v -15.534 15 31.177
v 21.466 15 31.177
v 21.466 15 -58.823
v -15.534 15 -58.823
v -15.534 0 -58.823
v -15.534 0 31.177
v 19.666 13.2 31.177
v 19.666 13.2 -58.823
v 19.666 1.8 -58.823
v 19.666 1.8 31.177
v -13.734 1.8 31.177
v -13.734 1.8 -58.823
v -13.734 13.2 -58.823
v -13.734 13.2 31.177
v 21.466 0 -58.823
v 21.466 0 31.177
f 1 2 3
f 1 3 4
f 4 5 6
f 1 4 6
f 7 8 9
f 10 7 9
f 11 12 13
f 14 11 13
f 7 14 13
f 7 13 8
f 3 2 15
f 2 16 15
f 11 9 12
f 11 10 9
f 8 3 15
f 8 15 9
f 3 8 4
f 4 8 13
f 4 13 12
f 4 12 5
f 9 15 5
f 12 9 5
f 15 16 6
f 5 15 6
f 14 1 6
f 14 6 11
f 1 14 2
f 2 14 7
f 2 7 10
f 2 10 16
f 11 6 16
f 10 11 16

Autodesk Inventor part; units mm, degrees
ref_plane "YZ Plane" through (0, 0, 0) normal (1, 0, 0) x (0, 1, 0)
ref_plane "XZ Plane" through (0, 0, 0) normal (0, 1, 0) x (-1, 0, 0)
ref_plane "XY Plane" through (0, 0, 0) normal (0, 0, 1) x (1, 0, 0)
sketch "Boceto1" plane through (0, 0, 0) normal (0, 1, 0) x (-1, 0, 0)
  line L0 (15.5342, 31.1771) -> (-21.4658, 31.1771)
  line L1 (-21.4658, 31.1771) -> (-21.4658, -58.8229)
  line L2 (-21.4658, -58.8229) -> (15.5342, -58.8229)
  line L3 (15.5342, -58.8229) -> (15.5342, 31.1771)
  point P0 (0, 0)
  dimension "d0" = 37
  dimension "d1" = 90
extrude "Extrusión1" add sketch "Boceto1" along normal blind 15
sketch "Boceto2" plane through (-15.5342, 0, 31.1771) normal (0, 0, 1) x (1, 0, 0)
  line L0 (1.8, 13.2) -> (35.2, 13.2)
  line L1 (35.2, 13.2) -> (35.2, 1.8)
  line L2 (35.2, 1.8) -> (1.8, 1.8)
  line L3 (1.8, 1.8) -> (1.8, 13.2)
  line L4 (0, 15) -> (37, 15) projected
  line L5 (0, 0) -> (37, 0) projected
  line L6 (0, 0) -> (0, 15) projected
  line L7 (37, 0) -> (37, 15) projected
  point P0 (15.5342, 0)
  dimension "d4" = 1.8
  dimension "d5" = 1.8
  dimension "d6" = 1.8
  dimension "d7" = 1.8
  dimension "d8" = 33.4
  dimension "d9" = 11.4
extrude "Extrusión2" cut sketch "Boceto2" against normal blind 90 contours L0 L1 L2 L3
properties part number "caja_grafeno"
